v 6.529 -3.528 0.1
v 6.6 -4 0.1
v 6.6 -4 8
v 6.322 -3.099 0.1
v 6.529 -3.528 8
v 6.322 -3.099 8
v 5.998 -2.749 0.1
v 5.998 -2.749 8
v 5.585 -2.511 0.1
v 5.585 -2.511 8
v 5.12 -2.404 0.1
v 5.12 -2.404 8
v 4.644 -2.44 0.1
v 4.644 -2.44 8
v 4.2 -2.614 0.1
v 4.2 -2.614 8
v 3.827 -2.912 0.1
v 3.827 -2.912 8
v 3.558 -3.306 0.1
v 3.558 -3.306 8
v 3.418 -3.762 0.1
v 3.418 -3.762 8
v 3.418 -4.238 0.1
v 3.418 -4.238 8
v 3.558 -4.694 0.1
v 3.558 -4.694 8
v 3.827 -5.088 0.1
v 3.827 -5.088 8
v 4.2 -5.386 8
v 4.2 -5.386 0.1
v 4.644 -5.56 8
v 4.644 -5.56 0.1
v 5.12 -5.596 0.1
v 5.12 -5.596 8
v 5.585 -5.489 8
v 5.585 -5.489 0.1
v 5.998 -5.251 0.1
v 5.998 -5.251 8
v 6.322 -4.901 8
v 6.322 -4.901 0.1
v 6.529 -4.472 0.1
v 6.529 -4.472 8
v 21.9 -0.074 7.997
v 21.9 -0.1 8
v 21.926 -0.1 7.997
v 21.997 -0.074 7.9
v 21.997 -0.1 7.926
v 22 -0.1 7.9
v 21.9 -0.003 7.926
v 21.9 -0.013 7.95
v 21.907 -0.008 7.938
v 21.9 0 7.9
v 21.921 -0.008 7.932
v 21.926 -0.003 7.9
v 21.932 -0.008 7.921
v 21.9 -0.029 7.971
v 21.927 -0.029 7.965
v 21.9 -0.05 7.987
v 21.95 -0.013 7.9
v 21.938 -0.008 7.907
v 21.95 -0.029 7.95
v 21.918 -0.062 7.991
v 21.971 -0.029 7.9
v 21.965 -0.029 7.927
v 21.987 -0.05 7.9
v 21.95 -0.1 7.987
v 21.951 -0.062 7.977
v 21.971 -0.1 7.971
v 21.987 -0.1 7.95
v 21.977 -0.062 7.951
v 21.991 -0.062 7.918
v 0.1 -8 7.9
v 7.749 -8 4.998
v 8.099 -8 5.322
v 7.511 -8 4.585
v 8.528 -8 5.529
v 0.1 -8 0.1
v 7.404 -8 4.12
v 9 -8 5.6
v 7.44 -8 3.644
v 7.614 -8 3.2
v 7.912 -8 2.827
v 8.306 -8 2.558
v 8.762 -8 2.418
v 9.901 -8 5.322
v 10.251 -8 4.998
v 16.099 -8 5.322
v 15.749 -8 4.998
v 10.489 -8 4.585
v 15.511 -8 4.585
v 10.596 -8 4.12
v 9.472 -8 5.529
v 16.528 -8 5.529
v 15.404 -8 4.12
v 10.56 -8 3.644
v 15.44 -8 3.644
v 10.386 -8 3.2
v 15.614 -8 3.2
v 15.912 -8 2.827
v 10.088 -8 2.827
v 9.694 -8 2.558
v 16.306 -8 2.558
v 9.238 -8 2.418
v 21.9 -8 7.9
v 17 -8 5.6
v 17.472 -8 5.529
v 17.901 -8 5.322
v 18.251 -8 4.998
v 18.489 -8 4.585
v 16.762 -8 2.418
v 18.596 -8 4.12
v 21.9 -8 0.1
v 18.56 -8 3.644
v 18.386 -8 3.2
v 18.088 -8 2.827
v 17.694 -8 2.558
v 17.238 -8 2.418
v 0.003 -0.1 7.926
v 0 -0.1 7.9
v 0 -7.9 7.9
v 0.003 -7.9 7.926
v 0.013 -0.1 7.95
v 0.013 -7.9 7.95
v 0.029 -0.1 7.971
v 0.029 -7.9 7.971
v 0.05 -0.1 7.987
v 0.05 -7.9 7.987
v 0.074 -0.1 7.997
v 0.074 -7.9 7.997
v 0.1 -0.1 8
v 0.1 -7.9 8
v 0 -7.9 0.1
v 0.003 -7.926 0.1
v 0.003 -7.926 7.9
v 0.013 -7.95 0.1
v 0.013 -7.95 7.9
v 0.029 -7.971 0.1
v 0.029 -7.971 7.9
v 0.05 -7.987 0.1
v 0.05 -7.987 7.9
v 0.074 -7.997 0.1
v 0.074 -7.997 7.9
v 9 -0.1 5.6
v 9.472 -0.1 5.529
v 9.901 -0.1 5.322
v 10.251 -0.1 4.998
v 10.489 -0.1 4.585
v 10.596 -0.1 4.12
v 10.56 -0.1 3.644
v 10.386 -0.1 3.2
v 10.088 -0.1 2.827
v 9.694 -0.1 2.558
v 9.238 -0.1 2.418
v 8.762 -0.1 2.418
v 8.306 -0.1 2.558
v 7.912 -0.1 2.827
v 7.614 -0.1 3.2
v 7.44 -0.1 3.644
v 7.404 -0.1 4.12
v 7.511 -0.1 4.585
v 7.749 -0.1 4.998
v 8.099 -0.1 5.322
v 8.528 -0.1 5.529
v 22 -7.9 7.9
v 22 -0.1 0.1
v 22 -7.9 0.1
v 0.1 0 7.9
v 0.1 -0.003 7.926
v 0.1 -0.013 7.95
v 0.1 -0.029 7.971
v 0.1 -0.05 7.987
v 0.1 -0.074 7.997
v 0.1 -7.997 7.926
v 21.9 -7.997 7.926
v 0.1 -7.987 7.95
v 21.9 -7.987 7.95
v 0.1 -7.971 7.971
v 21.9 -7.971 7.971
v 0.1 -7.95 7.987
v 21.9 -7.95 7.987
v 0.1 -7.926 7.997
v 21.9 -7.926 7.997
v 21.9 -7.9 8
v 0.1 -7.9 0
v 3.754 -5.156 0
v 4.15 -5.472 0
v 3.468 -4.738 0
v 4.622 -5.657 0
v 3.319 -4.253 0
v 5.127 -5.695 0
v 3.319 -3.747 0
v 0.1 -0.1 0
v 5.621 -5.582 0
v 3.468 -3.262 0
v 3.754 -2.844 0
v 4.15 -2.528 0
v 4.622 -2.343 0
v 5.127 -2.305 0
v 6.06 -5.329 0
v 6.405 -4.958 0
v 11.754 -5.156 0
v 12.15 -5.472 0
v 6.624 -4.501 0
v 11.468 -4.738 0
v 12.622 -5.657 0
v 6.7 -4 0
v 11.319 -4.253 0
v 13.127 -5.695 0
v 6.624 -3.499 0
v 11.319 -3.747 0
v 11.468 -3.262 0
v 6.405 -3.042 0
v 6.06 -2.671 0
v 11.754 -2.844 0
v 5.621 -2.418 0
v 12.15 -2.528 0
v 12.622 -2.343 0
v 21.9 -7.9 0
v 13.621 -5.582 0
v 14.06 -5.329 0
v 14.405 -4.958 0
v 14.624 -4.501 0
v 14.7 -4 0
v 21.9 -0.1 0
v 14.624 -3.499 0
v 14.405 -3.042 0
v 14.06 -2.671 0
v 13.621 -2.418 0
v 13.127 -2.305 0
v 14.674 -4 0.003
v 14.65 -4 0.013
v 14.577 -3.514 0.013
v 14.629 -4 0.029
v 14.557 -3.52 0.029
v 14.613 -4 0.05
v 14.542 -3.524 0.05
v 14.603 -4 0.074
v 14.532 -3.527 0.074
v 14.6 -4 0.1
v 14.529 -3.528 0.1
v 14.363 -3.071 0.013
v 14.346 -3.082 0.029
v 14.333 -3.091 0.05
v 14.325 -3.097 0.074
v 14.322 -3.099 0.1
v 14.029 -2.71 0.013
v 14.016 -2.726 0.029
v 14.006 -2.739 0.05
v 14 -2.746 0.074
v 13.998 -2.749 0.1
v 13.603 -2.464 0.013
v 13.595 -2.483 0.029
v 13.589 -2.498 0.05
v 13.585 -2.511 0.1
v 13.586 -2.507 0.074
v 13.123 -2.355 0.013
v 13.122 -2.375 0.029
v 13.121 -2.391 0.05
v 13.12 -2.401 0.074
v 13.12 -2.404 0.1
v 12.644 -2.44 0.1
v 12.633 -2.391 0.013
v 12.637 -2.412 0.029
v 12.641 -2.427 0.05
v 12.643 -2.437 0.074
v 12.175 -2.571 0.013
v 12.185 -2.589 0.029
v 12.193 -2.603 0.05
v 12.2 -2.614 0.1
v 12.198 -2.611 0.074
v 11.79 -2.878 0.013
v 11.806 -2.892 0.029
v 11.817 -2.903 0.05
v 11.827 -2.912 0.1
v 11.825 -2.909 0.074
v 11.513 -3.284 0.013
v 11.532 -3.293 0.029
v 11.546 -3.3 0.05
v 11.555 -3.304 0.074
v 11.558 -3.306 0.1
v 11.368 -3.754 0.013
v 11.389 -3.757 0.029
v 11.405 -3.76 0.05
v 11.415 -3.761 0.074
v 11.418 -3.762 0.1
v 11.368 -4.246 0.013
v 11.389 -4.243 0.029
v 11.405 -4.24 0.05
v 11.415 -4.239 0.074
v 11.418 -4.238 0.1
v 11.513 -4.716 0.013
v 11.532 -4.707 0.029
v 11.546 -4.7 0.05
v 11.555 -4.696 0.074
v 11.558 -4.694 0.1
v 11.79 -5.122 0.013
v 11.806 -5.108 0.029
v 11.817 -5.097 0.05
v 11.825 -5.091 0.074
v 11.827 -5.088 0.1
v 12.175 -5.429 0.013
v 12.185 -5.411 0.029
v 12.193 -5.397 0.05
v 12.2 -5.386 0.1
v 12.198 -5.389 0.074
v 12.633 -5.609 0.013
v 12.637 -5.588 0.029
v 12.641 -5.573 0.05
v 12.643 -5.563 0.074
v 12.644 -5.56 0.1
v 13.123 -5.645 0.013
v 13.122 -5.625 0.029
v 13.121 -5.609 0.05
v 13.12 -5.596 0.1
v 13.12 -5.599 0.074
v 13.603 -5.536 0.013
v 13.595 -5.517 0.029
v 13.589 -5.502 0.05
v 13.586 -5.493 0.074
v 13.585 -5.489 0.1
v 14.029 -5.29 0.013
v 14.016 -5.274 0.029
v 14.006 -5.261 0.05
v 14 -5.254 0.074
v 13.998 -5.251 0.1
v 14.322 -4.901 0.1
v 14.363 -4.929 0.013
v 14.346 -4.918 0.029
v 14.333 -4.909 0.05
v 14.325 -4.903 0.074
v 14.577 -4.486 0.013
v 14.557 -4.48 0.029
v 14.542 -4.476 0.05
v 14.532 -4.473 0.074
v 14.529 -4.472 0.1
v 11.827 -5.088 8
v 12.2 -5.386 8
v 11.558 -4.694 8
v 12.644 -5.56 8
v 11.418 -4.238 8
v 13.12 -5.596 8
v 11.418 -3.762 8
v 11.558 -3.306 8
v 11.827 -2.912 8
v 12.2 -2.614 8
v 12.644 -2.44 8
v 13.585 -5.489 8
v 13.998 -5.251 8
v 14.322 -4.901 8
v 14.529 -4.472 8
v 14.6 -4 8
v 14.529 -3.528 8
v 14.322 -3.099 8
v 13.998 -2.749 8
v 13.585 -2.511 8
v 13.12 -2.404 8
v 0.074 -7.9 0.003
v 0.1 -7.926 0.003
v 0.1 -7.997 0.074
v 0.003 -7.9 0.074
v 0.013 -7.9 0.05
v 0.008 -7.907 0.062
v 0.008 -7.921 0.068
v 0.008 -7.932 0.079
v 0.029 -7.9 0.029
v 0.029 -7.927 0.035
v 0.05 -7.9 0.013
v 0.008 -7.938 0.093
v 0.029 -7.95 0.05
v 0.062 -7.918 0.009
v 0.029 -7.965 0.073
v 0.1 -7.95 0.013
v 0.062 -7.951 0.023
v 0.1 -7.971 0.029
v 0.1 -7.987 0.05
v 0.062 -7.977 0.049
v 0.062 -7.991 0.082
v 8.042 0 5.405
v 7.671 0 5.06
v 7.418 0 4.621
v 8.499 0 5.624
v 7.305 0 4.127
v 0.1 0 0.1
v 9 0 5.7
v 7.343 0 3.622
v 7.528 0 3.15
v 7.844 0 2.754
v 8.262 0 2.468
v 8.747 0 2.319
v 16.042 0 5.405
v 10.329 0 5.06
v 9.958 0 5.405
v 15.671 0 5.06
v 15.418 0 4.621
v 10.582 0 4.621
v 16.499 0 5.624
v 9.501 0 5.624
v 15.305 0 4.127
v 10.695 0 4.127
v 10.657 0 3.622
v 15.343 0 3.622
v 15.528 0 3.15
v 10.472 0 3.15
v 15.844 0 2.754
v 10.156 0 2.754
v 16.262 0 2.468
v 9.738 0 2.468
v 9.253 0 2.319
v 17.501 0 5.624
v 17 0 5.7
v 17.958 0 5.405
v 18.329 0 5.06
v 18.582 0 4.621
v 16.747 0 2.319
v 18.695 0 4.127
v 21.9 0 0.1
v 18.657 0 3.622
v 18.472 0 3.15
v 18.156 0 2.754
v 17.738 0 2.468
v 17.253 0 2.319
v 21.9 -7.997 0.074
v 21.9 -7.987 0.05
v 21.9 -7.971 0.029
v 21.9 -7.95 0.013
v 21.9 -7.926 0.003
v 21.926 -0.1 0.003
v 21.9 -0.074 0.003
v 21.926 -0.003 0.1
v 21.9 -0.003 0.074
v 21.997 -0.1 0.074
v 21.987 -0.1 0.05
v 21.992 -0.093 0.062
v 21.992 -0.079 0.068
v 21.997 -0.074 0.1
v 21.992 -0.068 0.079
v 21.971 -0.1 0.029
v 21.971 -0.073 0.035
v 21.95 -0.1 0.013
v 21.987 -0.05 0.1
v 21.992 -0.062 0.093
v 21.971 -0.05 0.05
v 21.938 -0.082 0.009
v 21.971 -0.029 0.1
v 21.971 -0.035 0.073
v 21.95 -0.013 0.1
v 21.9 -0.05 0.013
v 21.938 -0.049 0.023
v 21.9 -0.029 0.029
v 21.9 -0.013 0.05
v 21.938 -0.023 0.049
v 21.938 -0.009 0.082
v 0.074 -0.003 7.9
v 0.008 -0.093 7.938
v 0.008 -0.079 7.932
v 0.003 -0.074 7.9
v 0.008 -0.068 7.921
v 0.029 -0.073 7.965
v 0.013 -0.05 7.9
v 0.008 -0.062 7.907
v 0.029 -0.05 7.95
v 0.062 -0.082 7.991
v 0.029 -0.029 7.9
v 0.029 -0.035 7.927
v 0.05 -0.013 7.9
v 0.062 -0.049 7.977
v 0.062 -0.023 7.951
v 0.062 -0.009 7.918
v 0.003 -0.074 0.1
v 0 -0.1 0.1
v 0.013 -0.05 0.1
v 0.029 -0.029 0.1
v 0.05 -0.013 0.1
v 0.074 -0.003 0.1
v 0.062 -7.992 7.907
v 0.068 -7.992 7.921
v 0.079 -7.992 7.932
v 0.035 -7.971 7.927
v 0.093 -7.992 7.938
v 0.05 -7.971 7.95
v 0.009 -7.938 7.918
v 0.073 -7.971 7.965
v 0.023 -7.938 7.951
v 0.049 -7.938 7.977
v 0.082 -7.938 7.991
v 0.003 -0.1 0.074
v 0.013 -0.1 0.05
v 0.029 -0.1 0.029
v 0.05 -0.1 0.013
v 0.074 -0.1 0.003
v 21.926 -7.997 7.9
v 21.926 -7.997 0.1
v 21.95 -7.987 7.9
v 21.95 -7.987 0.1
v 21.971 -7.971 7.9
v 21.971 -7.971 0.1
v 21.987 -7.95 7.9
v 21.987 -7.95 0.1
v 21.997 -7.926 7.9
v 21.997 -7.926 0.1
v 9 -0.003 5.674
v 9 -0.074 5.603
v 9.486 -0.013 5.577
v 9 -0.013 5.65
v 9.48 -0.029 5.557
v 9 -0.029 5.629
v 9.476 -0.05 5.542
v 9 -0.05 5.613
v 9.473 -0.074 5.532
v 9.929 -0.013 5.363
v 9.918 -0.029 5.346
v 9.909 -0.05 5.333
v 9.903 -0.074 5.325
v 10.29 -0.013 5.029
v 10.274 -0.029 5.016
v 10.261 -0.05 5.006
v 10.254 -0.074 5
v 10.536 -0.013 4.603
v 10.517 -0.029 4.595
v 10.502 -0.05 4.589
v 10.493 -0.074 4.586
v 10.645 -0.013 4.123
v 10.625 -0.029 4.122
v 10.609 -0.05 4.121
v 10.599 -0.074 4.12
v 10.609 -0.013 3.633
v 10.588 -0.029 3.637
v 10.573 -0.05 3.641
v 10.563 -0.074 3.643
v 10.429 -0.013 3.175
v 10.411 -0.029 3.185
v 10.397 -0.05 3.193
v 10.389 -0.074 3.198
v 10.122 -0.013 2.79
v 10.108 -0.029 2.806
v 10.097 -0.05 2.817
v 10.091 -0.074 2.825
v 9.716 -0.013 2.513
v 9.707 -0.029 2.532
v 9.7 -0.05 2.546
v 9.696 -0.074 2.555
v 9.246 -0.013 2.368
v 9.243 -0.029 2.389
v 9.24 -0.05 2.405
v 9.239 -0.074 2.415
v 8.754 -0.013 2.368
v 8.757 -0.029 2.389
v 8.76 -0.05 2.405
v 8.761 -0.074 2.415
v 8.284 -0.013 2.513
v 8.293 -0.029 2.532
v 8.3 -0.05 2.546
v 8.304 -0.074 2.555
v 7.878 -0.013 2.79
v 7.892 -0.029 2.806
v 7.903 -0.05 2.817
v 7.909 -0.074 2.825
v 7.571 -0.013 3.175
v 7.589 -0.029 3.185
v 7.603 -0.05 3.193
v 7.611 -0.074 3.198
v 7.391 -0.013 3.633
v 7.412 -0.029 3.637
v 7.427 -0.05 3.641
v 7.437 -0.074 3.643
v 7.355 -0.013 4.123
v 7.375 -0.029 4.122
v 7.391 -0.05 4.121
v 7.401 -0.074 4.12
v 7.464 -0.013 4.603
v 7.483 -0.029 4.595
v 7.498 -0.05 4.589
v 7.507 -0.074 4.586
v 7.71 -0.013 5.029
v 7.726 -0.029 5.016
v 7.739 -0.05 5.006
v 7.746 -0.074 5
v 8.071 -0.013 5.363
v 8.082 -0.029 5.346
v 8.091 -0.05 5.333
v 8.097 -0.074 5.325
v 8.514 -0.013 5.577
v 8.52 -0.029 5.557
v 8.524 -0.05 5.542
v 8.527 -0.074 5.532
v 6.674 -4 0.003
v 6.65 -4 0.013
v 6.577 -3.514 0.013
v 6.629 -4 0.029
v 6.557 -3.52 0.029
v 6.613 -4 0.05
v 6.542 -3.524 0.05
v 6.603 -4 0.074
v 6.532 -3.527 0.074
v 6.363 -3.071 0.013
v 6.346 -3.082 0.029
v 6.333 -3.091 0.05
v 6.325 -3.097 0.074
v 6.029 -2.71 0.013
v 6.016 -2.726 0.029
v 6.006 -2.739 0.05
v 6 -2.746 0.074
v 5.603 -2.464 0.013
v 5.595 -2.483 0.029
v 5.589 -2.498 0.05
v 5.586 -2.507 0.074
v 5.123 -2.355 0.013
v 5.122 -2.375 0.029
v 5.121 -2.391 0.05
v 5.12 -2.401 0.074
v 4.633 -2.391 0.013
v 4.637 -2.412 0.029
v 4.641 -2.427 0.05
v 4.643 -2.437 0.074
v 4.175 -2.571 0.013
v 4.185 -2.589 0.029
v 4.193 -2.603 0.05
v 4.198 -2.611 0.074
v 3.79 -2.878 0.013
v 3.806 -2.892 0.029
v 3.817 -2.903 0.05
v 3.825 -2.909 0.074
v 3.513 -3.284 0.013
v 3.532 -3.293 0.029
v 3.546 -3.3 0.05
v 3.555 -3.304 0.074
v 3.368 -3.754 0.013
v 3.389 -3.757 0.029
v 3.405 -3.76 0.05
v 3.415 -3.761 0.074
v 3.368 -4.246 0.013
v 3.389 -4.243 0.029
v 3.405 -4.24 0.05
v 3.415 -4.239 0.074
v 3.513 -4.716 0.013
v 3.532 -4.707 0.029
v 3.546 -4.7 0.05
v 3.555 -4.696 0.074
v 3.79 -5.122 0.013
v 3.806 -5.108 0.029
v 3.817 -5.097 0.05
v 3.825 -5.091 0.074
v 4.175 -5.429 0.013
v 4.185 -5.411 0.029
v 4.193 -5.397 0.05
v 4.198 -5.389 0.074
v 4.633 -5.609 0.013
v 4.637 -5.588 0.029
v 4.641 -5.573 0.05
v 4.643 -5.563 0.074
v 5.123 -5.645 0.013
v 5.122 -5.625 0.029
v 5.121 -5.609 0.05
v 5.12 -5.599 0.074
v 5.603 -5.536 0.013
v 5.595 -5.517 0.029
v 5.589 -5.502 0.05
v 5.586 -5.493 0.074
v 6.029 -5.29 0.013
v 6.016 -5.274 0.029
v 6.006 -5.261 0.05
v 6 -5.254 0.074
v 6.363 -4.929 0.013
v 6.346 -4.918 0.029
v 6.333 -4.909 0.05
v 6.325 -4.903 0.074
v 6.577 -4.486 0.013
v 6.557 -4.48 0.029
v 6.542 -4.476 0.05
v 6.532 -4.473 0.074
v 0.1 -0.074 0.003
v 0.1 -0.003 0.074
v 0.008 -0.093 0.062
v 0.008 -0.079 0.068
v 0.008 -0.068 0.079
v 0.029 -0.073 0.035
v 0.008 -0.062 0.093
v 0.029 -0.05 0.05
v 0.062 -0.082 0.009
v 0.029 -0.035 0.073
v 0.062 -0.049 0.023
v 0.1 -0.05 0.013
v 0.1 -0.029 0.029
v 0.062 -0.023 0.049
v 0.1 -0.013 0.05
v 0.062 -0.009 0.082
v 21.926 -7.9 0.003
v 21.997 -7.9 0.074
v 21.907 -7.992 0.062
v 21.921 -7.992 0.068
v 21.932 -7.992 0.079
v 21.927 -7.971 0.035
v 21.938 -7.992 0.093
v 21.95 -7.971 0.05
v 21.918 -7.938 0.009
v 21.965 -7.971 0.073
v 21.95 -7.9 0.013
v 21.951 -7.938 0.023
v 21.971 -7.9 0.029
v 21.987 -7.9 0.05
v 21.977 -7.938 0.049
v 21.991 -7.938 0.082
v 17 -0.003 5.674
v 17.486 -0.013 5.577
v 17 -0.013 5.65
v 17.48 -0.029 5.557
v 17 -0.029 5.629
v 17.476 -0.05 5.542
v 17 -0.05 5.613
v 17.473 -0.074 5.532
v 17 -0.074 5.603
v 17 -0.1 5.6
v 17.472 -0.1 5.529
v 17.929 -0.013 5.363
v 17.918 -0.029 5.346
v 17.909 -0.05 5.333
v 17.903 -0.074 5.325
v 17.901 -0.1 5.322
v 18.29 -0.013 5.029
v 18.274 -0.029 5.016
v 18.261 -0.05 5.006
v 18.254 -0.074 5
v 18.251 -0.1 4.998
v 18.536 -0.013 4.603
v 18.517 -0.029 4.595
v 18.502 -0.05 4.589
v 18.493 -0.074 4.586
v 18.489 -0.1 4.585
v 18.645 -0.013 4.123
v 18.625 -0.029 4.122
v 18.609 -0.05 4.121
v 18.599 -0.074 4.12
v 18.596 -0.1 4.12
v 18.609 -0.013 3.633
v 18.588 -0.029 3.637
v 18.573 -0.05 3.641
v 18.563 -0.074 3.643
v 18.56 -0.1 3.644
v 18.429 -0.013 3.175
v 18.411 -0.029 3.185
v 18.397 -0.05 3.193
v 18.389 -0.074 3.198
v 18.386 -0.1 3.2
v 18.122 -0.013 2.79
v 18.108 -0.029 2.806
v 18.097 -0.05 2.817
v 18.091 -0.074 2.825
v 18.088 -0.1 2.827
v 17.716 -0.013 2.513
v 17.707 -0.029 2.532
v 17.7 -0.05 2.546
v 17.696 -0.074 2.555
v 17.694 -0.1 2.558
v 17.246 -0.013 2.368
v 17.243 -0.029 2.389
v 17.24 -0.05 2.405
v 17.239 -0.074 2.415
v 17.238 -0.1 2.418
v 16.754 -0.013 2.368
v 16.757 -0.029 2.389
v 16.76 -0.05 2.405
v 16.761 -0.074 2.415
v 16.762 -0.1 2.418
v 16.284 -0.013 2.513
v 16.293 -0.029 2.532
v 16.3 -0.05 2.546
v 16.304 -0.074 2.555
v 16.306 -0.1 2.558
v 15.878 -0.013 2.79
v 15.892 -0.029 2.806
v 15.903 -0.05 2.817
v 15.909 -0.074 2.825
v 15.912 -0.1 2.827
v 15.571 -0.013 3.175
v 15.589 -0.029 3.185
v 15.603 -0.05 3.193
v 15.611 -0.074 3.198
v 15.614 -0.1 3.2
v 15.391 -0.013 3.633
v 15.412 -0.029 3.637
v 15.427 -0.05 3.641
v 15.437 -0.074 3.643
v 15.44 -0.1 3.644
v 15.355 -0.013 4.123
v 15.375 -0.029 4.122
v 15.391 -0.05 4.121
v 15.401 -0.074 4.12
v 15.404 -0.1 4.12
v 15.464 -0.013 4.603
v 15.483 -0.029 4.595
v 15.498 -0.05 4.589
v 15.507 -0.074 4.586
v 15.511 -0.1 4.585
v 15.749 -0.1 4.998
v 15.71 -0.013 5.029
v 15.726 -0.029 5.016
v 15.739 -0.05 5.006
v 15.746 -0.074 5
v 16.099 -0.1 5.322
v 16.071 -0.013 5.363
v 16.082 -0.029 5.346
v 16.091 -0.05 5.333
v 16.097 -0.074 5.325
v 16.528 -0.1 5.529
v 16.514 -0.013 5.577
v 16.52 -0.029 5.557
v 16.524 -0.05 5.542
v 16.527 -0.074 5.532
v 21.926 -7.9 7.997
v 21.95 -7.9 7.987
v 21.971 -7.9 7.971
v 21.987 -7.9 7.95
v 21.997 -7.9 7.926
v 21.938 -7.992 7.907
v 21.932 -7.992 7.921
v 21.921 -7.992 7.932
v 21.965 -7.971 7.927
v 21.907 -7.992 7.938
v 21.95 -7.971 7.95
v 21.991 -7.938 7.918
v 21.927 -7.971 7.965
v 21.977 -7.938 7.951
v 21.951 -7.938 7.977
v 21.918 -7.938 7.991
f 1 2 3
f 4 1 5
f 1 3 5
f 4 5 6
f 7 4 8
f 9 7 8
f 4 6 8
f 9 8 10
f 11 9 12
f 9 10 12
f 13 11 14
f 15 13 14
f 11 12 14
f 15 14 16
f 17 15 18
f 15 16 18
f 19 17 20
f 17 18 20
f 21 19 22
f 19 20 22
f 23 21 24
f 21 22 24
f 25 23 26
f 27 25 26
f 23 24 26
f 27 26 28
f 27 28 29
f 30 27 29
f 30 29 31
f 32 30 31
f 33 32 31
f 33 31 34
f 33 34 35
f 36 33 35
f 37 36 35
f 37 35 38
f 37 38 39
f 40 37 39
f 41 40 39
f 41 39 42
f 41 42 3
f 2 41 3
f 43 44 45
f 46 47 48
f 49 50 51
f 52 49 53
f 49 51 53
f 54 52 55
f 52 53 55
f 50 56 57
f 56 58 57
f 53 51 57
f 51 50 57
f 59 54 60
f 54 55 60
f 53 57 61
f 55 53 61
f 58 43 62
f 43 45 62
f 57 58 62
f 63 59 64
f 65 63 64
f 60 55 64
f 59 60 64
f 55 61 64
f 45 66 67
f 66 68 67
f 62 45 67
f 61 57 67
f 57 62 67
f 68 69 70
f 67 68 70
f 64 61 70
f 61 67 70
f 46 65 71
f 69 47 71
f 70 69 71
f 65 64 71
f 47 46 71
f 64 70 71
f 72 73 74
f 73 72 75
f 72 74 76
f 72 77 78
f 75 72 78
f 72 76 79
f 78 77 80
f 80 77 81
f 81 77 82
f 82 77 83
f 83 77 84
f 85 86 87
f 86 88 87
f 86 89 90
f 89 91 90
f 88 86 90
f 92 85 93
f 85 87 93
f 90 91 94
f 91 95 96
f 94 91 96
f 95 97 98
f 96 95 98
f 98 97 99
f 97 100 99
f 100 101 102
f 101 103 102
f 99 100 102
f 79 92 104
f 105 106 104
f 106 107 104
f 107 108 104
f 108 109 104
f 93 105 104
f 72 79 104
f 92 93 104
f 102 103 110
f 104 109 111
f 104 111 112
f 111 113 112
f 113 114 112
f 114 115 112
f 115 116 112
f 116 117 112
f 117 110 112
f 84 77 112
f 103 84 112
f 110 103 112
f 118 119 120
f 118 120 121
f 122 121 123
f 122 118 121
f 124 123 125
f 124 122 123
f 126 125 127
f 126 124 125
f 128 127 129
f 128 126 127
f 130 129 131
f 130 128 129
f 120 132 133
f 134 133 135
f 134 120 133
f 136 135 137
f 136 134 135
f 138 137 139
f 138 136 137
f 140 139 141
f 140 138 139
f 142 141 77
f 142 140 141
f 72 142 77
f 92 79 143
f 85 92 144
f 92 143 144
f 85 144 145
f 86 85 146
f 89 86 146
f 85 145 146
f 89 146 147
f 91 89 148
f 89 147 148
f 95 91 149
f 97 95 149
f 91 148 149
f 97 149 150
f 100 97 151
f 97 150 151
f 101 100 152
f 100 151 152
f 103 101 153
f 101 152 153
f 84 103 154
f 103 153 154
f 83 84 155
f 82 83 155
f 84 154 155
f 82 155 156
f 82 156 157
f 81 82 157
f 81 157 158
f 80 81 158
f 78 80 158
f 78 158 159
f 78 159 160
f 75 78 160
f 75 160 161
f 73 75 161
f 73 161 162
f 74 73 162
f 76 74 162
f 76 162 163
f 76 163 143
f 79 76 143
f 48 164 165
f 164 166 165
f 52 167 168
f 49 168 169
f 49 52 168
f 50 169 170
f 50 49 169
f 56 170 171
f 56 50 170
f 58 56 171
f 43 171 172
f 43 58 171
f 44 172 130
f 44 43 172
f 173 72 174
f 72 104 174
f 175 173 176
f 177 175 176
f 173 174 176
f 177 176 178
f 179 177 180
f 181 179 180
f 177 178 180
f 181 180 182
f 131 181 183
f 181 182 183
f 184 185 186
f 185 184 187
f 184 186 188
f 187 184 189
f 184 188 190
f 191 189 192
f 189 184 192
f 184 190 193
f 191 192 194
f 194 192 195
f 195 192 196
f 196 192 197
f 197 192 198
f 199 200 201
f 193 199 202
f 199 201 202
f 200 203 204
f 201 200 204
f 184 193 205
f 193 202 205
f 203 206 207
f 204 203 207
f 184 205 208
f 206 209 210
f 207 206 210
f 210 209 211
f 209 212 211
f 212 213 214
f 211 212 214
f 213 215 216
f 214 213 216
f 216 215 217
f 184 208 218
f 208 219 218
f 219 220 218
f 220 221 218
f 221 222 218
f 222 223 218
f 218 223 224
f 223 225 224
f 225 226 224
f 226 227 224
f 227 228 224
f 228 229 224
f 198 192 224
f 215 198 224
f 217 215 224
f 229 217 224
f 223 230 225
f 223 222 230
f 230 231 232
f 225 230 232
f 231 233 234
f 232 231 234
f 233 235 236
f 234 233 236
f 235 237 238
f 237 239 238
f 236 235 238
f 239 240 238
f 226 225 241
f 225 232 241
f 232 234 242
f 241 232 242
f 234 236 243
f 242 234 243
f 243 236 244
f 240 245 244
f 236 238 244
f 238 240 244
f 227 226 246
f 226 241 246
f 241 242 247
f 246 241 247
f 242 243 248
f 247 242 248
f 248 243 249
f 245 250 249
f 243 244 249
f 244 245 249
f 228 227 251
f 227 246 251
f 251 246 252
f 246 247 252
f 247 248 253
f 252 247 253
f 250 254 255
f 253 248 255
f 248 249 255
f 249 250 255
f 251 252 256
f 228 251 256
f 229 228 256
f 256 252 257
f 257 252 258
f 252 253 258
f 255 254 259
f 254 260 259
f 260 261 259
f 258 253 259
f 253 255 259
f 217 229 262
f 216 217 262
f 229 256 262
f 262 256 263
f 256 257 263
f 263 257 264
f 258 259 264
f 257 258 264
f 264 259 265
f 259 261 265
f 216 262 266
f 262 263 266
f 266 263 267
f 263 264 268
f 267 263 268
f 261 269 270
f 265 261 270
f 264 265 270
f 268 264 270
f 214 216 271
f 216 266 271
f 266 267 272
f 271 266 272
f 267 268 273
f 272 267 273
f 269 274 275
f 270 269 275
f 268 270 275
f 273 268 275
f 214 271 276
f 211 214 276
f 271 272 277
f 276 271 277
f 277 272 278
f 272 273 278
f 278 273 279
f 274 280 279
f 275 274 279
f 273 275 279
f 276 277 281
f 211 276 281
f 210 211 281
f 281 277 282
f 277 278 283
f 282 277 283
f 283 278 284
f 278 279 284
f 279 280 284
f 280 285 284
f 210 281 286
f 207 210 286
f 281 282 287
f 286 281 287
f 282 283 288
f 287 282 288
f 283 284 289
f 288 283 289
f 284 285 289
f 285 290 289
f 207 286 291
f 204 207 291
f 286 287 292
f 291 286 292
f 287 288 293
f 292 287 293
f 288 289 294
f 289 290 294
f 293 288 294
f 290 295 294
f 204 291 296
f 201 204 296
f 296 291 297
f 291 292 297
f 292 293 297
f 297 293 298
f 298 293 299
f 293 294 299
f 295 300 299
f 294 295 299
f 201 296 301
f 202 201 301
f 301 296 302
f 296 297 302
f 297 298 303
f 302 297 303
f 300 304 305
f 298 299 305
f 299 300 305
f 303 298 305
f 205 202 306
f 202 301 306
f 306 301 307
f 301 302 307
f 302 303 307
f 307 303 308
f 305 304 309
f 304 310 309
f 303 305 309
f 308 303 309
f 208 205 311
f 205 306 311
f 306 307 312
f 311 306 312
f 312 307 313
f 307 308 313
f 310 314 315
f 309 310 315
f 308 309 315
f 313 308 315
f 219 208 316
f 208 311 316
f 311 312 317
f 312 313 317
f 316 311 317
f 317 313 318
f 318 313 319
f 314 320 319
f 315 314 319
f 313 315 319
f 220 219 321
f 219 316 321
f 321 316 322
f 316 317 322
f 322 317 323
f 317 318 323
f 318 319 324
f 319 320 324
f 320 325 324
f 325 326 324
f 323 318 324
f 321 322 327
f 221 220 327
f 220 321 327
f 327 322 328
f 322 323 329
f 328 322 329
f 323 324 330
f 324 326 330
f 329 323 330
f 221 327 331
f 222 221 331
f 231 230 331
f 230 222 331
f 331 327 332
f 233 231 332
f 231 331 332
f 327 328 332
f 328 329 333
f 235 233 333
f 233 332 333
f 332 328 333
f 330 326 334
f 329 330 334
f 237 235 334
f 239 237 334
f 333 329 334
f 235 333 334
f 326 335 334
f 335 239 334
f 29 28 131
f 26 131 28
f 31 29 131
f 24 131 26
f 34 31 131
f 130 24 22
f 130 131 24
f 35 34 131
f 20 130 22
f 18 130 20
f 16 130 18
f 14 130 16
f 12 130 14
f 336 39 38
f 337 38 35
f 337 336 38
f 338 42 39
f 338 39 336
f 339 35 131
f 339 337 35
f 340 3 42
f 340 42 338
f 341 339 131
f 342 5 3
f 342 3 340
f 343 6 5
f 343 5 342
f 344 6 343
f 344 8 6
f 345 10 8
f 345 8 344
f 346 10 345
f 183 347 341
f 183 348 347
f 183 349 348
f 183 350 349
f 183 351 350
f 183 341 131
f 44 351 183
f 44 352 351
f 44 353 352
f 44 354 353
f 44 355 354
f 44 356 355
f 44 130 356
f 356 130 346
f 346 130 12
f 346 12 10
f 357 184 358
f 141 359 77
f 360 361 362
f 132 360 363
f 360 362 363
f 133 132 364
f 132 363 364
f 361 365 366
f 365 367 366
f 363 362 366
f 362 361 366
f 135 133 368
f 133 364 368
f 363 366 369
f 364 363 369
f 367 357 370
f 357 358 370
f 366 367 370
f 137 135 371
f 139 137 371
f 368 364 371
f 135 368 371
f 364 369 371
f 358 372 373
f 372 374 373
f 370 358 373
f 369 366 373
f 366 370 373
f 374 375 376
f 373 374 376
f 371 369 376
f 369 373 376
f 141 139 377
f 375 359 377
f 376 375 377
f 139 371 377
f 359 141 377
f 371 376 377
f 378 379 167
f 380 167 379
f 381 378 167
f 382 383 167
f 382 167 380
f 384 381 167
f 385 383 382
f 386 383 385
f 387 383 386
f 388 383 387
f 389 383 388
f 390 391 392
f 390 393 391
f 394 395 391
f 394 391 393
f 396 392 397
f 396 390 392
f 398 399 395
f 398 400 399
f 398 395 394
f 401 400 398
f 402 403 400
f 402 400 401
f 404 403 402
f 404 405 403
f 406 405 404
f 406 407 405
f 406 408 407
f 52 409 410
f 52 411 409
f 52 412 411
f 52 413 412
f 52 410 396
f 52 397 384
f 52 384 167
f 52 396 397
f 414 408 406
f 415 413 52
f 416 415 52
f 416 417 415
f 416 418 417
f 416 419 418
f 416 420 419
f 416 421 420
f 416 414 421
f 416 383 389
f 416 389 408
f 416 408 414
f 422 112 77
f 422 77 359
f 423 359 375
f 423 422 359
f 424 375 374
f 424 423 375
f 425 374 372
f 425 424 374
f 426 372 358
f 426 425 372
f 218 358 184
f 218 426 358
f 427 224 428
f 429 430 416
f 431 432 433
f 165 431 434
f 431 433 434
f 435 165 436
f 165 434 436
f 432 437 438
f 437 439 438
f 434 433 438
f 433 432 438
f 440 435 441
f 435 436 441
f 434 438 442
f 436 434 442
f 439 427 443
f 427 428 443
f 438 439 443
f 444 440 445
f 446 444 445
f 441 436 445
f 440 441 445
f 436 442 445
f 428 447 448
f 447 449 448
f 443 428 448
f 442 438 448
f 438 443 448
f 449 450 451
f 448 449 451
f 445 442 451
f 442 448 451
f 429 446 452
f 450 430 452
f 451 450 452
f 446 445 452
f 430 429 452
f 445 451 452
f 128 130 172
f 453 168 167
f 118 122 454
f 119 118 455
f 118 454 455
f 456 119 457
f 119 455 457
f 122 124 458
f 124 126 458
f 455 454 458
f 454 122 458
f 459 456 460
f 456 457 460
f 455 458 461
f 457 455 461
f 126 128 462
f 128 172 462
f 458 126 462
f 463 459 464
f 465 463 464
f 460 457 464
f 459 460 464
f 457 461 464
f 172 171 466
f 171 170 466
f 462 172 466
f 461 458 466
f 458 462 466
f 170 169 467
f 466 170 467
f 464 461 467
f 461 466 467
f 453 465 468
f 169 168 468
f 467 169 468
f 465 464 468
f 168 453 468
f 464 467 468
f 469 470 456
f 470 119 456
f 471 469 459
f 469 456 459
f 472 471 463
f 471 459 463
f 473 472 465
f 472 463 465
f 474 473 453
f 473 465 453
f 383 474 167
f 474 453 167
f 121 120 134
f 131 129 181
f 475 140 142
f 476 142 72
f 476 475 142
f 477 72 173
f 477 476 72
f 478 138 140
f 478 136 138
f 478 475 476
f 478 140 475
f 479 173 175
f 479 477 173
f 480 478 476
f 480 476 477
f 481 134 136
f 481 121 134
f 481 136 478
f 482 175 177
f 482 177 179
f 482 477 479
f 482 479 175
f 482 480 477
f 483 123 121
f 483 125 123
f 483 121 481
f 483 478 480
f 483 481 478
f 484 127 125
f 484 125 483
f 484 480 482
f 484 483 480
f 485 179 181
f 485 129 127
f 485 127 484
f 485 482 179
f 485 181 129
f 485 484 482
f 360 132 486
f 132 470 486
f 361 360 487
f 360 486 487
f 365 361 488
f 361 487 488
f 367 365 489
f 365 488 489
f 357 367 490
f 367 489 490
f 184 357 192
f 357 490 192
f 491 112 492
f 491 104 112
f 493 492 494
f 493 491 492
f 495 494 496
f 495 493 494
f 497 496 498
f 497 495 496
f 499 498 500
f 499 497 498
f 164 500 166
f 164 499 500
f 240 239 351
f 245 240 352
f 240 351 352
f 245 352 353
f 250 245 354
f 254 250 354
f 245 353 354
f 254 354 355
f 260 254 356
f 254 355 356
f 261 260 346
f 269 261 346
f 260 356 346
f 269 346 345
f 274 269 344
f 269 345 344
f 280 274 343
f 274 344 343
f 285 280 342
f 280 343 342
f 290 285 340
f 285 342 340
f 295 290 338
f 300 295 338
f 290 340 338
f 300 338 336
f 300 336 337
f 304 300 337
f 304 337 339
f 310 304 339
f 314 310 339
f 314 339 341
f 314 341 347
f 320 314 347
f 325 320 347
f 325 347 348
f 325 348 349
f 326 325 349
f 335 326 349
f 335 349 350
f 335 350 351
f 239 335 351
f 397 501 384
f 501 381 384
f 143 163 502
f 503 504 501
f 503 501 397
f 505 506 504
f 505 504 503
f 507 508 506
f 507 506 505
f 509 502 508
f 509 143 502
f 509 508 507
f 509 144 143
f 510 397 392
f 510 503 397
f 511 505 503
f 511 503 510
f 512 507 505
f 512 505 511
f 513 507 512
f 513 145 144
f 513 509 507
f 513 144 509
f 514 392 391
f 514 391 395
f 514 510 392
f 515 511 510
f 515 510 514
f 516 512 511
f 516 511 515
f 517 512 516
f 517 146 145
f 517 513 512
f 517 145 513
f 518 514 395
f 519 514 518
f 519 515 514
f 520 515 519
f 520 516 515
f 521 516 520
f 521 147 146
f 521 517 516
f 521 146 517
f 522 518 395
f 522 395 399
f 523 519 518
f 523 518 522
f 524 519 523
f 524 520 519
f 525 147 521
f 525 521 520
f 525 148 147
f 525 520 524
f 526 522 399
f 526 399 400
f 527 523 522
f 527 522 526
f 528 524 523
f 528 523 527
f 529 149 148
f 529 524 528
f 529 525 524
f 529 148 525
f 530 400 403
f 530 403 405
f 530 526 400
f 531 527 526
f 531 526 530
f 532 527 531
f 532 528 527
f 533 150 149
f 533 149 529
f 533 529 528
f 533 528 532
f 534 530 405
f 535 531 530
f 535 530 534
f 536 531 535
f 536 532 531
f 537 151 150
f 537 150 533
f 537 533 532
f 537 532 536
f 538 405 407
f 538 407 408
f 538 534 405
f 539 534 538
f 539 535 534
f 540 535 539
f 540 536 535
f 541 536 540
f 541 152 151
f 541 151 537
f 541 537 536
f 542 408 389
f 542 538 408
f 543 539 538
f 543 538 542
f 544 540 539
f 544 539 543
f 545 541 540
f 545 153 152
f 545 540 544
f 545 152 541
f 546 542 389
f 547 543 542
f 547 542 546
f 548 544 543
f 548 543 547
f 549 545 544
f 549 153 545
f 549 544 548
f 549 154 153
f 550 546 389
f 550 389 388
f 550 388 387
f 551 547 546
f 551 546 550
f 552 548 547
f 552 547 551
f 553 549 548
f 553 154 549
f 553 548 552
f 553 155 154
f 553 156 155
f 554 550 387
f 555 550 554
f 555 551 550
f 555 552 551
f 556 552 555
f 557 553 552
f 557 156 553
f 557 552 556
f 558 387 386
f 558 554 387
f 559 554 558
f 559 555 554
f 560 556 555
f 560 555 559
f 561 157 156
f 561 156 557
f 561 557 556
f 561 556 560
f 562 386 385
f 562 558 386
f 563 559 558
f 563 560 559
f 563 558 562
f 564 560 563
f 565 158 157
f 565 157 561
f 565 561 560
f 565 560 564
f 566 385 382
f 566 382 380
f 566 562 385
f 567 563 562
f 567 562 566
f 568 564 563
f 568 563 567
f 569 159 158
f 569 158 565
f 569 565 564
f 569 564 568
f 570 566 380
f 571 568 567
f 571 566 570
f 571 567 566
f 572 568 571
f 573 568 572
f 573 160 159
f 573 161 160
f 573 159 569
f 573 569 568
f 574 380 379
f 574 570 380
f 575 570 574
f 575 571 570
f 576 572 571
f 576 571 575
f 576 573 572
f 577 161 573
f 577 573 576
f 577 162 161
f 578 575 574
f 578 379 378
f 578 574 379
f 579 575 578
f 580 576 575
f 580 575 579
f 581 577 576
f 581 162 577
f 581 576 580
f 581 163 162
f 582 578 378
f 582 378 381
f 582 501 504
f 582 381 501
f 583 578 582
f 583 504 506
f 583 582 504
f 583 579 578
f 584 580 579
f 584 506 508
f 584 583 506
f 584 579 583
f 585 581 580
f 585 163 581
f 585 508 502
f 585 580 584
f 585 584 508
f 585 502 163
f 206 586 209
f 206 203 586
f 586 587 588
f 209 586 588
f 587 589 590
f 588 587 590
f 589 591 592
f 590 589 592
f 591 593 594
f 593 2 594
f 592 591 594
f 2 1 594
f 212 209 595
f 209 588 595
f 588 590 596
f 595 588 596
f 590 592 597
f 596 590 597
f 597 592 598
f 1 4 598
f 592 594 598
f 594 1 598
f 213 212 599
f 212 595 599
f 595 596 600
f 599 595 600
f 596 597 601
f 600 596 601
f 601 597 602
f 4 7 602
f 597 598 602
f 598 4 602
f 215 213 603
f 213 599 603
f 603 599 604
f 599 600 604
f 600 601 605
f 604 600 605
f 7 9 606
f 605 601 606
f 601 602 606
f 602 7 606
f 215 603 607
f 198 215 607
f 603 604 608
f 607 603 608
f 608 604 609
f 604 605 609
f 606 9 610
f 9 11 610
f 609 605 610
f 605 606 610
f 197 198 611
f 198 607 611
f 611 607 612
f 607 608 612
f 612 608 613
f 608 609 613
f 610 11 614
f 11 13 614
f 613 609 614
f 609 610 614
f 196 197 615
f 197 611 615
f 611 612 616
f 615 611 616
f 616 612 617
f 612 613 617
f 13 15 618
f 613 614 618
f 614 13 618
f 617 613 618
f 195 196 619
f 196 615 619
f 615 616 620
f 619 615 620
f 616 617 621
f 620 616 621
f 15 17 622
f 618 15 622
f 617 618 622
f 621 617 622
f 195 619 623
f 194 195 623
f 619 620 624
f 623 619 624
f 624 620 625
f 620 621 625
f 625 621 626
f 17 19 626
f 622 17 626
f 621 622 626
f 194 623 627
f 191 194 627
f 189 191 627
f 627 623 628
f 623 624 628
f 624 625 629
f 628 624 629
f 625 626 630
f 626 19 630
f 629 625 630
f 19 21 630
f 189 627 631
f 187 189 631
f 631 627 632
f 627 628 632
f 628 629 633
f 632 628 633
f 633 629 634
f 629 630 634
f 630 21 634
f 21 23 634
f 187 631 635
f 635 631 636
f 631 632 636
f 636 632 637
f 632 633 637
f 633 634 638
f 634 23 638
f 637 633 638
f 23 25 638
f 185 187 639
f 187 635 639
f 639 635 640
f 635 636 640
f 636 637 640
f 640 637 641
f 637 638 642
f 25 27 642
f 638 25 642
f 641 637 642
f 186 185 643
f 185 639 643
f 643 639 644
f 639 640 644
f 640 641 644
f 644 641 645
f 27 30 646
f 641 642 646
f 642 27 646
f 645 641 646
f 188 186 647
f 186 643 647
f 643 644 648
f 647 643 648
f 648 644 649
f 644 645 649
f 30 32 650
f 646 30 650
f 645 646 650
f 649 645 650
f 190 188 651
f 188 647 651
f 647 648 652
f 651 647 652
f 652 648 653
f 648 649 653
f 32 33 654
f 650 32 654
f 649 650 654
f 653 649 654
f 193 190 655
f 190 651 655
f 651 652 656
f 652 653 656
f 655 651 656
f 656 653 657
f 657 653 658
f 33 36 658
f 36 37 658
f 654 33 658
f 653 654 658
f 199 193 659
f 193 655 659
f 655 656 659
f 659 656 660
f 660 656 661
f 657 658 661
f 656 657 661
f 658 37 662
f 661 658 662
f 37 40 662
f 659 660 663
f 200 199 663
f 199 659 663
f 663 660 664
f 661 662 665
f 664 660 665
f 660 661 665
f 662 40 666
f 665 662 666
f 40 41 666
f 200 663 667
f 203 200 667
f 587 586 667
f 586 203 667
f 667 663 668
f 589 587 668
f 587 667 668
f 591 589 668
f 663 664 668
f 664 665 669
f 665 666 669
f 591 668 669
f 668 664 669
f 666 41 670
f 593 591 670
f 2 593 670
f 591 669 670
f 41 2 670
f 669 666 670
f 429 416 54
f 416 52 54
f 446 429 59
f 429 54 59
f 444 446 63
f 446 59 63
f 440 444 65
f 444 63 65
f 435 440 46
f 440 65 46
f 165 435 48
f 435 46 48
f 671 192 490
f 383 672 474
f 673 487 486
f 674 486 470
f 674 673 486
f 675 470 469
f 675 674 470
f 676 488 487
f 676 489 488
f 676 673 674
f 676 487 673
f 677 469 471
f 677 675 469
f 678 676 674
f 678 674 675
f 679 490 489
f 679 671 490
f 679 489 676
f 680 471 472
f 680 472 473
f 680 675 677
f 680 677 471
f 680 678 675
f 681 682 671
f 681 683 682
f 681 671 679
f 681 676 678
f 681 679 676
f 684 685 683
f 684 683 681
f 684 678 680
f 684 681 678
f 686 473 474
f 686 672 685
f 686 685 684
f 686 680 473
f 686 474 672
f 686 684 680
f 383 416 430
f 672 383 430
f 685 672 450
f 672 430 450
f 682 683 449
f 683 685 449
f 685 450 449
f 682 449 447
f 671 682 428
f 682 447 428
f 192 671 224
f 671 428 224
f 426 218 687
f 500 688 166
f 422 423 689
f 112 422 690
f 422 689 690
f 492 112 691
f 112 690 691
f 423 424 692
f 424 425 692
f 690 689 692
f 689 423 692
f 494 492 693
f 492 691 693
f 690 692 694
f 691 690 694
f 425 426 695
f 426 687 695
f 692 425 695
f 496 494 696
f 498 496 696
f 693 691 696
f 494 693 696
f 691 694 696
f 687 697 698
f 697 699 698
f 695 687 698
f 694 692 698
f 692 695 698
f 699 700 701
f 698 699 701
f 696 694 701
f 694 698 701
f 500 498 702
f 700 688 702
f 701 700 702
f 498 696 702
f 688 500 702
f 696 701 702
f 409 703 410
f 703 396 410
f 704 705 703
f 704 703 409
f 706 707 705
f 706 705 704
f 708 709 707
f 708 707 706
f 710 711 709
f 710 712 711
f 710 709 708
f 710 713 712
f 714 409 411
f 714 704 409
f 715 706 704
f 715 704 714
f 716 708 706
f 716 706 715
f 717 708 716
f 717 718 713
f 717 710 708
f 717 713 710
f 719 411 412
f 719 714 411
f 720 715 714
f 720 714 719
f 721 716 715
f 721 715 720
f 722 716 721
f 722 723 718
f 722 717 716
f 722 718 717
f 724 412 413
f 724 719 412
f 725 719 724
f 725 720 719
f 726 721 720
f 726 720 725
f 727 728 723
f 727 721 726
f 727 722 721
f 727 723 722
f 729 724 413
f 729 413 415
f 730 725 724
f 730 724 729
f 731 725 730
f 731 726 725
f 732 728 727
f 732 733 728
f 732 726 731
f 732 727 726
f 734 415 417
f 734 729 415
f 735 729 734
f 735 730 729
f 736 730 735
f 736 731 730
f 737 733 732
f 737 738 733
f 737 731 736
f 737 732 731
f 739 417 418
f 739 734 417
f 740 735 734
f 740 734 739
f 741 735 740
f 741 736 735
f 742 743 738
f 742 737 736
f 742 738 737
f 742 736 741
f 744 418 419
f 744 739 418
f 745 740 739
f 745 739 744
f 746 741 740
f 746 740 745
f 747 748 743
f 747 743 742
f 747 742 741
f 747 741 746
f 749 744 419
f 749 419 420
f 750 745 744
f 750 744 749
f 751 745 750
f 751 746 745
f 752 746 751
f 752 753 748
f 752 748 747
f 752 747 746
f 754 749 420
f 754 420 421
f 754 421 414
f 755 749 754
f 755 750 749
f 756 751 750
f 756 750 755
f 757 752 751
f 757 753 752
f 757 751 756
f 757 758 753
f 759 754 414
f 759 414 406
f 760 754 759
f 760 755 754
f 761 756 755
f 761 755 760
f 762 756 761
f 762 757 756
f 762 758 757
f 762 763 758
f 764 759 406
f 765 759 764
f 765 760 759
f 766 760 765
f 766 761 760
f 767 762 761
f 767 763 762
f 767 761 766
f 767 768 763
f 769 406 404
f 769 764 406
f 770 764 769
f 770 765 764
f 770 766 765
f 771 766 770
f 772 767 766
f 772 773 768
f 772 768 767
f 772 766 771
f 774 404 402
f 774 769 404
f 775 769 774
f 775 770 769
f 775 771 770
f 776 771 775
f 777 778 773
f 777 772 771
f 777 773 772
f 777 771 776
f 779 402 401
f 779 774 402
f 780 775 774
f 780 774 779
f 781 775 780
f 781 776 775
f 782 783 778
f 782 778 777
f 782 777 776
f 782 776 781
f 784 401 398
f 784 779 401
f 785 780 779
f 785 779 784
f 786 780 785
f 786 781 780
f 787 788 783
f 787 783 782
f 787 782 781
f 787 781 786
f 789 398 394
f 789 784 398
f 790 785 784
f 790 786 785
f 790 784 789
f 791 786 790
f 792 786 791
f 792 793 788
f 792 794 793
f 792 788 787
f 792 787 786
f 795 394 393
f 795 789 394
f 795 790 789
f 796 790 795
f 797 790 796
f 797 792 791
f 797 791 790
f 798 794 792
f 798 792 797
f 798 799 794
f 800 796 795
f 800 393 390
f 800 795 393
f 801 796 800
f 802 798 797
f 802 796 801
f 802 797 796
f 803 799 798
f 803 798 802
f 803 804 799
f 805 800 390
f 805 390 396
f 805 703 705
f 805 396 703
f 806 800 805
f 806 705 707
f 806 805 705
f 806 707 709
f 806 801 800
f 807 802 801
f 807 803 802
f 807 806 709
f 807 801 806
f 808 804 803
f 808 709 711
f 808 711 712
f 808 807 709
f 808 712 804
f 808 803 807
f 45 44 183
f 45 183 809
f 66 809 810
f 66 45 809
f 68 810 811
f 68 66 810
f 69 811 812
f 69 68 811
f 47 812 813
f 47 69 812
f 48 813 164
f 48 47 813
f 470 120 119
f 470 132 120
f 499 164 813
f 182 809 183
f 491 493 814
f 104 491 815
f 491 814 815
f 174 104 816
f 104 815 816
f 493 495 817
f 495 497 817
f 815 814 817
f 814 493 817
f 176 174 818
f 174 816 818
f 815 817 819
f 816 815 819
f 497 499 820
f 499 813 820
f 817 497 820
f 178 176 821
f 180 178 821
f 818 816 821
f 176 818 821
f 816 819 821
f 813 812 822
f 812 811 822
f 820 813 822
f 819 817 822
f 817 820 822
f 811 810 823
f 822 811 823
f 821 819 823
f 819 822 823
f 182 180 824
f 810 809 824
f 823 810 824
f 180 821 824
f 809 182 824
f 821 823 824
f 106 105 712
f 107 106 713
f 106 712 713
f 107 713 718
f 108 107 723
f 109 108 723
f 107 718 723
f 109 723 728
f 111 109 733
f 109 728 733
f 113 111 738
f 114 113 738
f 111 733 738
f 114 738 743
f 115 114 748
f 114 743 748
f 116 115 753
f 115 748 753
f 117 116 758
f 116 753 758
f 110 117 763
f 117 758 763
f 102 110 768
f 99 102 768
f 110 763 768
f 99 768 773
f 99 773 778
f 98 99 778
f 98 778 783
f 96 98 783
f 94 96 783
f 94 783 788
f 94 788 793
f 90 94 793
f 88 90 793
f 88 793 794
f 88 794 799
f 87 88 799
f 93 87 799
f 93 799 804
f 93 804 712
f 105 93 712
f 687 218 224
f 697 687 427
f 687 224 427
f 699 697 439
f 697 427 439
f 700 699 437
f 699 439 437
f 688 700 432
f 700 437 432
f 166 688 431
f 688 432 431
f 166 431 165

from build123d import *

# Parameters (mm, degrees)
SKETCH_1_W          = 22
SKETCH_1_H          = 8
EXTRUDE_1_DEPTH     = 8
SKETCH_2_R          = 1.6
CUT_EXTRUDE_1_DEPTH = 25.738633754
SKETCH_3_R          = 1.6
CUT_EXTRUDE_2_DEPTH = 25.738633754
FILLET_1_R          = 0.1


with BuildPart() as part:
    # 草图1 → 凸台-拉伸1 (new body)
    with BuildSketch(Plane.XY):
        with Locations((11, -4)):
            Rectangle(SKETCH_1_W, SKETCH_1_H)
    extrude(amount=EXTRUDE_1_DEPTH)

    # 草图2 → 切除-拉伸1 (cut, through all)
    with BuildSketch(Plane.XY.offset(8)):
        with Locations((5, -4)):
            Circle(SKETCH_2_R)
        with Locations((13, -4)):
            Circle(SKETCH_2_R)
    extrude(amount=-CUT_EXTRUDE_1_DEPTH, mode=Mode.SUBTRACT)

    # 草图3 → 切除-拉伸2 (cut, through all)
    with BuildSketch(Plane(origin=(0, 0, 0), x_dir=(1, 0, 0), z_dir=(0, 1, 0))):
        with Locations(Location((17, -4, 0), (0, 0, 270))):
            Circle(SKETCH_3_R)
        with Locations(Location((9, -4, 0), (0, 0, 270))):
            Circle(SKETCH_3_R)
    extrude(amount=-CUT_EXTRUDE_2_DEPTH, mode=Mode.SUBTRACT)

    # 圆角1
    fillet_1_edges = [part.edges().sort_by_distance(p)[0] for p in [
        (22, -4, 8),
        (11, 0, 8),
        (3.4, -4, 0),
        (11.4, -4, 0),
        (17, 0, 2.4),
        (9, 0, 2.4),
        (0, -4, 8),
        (11, 0, 0),
        (22, -4, 0),
        (11, -8, 0),
        (0, -4, 0),
        (0, 0, 4),
        (22, 0, 4),
        (22, -8, 4),
        (0, -8, 4),
        (11, -8, 8),
    ]]
    fillet(fillet_1_edges, radius=FILLET_1_R)


solid = part.part
